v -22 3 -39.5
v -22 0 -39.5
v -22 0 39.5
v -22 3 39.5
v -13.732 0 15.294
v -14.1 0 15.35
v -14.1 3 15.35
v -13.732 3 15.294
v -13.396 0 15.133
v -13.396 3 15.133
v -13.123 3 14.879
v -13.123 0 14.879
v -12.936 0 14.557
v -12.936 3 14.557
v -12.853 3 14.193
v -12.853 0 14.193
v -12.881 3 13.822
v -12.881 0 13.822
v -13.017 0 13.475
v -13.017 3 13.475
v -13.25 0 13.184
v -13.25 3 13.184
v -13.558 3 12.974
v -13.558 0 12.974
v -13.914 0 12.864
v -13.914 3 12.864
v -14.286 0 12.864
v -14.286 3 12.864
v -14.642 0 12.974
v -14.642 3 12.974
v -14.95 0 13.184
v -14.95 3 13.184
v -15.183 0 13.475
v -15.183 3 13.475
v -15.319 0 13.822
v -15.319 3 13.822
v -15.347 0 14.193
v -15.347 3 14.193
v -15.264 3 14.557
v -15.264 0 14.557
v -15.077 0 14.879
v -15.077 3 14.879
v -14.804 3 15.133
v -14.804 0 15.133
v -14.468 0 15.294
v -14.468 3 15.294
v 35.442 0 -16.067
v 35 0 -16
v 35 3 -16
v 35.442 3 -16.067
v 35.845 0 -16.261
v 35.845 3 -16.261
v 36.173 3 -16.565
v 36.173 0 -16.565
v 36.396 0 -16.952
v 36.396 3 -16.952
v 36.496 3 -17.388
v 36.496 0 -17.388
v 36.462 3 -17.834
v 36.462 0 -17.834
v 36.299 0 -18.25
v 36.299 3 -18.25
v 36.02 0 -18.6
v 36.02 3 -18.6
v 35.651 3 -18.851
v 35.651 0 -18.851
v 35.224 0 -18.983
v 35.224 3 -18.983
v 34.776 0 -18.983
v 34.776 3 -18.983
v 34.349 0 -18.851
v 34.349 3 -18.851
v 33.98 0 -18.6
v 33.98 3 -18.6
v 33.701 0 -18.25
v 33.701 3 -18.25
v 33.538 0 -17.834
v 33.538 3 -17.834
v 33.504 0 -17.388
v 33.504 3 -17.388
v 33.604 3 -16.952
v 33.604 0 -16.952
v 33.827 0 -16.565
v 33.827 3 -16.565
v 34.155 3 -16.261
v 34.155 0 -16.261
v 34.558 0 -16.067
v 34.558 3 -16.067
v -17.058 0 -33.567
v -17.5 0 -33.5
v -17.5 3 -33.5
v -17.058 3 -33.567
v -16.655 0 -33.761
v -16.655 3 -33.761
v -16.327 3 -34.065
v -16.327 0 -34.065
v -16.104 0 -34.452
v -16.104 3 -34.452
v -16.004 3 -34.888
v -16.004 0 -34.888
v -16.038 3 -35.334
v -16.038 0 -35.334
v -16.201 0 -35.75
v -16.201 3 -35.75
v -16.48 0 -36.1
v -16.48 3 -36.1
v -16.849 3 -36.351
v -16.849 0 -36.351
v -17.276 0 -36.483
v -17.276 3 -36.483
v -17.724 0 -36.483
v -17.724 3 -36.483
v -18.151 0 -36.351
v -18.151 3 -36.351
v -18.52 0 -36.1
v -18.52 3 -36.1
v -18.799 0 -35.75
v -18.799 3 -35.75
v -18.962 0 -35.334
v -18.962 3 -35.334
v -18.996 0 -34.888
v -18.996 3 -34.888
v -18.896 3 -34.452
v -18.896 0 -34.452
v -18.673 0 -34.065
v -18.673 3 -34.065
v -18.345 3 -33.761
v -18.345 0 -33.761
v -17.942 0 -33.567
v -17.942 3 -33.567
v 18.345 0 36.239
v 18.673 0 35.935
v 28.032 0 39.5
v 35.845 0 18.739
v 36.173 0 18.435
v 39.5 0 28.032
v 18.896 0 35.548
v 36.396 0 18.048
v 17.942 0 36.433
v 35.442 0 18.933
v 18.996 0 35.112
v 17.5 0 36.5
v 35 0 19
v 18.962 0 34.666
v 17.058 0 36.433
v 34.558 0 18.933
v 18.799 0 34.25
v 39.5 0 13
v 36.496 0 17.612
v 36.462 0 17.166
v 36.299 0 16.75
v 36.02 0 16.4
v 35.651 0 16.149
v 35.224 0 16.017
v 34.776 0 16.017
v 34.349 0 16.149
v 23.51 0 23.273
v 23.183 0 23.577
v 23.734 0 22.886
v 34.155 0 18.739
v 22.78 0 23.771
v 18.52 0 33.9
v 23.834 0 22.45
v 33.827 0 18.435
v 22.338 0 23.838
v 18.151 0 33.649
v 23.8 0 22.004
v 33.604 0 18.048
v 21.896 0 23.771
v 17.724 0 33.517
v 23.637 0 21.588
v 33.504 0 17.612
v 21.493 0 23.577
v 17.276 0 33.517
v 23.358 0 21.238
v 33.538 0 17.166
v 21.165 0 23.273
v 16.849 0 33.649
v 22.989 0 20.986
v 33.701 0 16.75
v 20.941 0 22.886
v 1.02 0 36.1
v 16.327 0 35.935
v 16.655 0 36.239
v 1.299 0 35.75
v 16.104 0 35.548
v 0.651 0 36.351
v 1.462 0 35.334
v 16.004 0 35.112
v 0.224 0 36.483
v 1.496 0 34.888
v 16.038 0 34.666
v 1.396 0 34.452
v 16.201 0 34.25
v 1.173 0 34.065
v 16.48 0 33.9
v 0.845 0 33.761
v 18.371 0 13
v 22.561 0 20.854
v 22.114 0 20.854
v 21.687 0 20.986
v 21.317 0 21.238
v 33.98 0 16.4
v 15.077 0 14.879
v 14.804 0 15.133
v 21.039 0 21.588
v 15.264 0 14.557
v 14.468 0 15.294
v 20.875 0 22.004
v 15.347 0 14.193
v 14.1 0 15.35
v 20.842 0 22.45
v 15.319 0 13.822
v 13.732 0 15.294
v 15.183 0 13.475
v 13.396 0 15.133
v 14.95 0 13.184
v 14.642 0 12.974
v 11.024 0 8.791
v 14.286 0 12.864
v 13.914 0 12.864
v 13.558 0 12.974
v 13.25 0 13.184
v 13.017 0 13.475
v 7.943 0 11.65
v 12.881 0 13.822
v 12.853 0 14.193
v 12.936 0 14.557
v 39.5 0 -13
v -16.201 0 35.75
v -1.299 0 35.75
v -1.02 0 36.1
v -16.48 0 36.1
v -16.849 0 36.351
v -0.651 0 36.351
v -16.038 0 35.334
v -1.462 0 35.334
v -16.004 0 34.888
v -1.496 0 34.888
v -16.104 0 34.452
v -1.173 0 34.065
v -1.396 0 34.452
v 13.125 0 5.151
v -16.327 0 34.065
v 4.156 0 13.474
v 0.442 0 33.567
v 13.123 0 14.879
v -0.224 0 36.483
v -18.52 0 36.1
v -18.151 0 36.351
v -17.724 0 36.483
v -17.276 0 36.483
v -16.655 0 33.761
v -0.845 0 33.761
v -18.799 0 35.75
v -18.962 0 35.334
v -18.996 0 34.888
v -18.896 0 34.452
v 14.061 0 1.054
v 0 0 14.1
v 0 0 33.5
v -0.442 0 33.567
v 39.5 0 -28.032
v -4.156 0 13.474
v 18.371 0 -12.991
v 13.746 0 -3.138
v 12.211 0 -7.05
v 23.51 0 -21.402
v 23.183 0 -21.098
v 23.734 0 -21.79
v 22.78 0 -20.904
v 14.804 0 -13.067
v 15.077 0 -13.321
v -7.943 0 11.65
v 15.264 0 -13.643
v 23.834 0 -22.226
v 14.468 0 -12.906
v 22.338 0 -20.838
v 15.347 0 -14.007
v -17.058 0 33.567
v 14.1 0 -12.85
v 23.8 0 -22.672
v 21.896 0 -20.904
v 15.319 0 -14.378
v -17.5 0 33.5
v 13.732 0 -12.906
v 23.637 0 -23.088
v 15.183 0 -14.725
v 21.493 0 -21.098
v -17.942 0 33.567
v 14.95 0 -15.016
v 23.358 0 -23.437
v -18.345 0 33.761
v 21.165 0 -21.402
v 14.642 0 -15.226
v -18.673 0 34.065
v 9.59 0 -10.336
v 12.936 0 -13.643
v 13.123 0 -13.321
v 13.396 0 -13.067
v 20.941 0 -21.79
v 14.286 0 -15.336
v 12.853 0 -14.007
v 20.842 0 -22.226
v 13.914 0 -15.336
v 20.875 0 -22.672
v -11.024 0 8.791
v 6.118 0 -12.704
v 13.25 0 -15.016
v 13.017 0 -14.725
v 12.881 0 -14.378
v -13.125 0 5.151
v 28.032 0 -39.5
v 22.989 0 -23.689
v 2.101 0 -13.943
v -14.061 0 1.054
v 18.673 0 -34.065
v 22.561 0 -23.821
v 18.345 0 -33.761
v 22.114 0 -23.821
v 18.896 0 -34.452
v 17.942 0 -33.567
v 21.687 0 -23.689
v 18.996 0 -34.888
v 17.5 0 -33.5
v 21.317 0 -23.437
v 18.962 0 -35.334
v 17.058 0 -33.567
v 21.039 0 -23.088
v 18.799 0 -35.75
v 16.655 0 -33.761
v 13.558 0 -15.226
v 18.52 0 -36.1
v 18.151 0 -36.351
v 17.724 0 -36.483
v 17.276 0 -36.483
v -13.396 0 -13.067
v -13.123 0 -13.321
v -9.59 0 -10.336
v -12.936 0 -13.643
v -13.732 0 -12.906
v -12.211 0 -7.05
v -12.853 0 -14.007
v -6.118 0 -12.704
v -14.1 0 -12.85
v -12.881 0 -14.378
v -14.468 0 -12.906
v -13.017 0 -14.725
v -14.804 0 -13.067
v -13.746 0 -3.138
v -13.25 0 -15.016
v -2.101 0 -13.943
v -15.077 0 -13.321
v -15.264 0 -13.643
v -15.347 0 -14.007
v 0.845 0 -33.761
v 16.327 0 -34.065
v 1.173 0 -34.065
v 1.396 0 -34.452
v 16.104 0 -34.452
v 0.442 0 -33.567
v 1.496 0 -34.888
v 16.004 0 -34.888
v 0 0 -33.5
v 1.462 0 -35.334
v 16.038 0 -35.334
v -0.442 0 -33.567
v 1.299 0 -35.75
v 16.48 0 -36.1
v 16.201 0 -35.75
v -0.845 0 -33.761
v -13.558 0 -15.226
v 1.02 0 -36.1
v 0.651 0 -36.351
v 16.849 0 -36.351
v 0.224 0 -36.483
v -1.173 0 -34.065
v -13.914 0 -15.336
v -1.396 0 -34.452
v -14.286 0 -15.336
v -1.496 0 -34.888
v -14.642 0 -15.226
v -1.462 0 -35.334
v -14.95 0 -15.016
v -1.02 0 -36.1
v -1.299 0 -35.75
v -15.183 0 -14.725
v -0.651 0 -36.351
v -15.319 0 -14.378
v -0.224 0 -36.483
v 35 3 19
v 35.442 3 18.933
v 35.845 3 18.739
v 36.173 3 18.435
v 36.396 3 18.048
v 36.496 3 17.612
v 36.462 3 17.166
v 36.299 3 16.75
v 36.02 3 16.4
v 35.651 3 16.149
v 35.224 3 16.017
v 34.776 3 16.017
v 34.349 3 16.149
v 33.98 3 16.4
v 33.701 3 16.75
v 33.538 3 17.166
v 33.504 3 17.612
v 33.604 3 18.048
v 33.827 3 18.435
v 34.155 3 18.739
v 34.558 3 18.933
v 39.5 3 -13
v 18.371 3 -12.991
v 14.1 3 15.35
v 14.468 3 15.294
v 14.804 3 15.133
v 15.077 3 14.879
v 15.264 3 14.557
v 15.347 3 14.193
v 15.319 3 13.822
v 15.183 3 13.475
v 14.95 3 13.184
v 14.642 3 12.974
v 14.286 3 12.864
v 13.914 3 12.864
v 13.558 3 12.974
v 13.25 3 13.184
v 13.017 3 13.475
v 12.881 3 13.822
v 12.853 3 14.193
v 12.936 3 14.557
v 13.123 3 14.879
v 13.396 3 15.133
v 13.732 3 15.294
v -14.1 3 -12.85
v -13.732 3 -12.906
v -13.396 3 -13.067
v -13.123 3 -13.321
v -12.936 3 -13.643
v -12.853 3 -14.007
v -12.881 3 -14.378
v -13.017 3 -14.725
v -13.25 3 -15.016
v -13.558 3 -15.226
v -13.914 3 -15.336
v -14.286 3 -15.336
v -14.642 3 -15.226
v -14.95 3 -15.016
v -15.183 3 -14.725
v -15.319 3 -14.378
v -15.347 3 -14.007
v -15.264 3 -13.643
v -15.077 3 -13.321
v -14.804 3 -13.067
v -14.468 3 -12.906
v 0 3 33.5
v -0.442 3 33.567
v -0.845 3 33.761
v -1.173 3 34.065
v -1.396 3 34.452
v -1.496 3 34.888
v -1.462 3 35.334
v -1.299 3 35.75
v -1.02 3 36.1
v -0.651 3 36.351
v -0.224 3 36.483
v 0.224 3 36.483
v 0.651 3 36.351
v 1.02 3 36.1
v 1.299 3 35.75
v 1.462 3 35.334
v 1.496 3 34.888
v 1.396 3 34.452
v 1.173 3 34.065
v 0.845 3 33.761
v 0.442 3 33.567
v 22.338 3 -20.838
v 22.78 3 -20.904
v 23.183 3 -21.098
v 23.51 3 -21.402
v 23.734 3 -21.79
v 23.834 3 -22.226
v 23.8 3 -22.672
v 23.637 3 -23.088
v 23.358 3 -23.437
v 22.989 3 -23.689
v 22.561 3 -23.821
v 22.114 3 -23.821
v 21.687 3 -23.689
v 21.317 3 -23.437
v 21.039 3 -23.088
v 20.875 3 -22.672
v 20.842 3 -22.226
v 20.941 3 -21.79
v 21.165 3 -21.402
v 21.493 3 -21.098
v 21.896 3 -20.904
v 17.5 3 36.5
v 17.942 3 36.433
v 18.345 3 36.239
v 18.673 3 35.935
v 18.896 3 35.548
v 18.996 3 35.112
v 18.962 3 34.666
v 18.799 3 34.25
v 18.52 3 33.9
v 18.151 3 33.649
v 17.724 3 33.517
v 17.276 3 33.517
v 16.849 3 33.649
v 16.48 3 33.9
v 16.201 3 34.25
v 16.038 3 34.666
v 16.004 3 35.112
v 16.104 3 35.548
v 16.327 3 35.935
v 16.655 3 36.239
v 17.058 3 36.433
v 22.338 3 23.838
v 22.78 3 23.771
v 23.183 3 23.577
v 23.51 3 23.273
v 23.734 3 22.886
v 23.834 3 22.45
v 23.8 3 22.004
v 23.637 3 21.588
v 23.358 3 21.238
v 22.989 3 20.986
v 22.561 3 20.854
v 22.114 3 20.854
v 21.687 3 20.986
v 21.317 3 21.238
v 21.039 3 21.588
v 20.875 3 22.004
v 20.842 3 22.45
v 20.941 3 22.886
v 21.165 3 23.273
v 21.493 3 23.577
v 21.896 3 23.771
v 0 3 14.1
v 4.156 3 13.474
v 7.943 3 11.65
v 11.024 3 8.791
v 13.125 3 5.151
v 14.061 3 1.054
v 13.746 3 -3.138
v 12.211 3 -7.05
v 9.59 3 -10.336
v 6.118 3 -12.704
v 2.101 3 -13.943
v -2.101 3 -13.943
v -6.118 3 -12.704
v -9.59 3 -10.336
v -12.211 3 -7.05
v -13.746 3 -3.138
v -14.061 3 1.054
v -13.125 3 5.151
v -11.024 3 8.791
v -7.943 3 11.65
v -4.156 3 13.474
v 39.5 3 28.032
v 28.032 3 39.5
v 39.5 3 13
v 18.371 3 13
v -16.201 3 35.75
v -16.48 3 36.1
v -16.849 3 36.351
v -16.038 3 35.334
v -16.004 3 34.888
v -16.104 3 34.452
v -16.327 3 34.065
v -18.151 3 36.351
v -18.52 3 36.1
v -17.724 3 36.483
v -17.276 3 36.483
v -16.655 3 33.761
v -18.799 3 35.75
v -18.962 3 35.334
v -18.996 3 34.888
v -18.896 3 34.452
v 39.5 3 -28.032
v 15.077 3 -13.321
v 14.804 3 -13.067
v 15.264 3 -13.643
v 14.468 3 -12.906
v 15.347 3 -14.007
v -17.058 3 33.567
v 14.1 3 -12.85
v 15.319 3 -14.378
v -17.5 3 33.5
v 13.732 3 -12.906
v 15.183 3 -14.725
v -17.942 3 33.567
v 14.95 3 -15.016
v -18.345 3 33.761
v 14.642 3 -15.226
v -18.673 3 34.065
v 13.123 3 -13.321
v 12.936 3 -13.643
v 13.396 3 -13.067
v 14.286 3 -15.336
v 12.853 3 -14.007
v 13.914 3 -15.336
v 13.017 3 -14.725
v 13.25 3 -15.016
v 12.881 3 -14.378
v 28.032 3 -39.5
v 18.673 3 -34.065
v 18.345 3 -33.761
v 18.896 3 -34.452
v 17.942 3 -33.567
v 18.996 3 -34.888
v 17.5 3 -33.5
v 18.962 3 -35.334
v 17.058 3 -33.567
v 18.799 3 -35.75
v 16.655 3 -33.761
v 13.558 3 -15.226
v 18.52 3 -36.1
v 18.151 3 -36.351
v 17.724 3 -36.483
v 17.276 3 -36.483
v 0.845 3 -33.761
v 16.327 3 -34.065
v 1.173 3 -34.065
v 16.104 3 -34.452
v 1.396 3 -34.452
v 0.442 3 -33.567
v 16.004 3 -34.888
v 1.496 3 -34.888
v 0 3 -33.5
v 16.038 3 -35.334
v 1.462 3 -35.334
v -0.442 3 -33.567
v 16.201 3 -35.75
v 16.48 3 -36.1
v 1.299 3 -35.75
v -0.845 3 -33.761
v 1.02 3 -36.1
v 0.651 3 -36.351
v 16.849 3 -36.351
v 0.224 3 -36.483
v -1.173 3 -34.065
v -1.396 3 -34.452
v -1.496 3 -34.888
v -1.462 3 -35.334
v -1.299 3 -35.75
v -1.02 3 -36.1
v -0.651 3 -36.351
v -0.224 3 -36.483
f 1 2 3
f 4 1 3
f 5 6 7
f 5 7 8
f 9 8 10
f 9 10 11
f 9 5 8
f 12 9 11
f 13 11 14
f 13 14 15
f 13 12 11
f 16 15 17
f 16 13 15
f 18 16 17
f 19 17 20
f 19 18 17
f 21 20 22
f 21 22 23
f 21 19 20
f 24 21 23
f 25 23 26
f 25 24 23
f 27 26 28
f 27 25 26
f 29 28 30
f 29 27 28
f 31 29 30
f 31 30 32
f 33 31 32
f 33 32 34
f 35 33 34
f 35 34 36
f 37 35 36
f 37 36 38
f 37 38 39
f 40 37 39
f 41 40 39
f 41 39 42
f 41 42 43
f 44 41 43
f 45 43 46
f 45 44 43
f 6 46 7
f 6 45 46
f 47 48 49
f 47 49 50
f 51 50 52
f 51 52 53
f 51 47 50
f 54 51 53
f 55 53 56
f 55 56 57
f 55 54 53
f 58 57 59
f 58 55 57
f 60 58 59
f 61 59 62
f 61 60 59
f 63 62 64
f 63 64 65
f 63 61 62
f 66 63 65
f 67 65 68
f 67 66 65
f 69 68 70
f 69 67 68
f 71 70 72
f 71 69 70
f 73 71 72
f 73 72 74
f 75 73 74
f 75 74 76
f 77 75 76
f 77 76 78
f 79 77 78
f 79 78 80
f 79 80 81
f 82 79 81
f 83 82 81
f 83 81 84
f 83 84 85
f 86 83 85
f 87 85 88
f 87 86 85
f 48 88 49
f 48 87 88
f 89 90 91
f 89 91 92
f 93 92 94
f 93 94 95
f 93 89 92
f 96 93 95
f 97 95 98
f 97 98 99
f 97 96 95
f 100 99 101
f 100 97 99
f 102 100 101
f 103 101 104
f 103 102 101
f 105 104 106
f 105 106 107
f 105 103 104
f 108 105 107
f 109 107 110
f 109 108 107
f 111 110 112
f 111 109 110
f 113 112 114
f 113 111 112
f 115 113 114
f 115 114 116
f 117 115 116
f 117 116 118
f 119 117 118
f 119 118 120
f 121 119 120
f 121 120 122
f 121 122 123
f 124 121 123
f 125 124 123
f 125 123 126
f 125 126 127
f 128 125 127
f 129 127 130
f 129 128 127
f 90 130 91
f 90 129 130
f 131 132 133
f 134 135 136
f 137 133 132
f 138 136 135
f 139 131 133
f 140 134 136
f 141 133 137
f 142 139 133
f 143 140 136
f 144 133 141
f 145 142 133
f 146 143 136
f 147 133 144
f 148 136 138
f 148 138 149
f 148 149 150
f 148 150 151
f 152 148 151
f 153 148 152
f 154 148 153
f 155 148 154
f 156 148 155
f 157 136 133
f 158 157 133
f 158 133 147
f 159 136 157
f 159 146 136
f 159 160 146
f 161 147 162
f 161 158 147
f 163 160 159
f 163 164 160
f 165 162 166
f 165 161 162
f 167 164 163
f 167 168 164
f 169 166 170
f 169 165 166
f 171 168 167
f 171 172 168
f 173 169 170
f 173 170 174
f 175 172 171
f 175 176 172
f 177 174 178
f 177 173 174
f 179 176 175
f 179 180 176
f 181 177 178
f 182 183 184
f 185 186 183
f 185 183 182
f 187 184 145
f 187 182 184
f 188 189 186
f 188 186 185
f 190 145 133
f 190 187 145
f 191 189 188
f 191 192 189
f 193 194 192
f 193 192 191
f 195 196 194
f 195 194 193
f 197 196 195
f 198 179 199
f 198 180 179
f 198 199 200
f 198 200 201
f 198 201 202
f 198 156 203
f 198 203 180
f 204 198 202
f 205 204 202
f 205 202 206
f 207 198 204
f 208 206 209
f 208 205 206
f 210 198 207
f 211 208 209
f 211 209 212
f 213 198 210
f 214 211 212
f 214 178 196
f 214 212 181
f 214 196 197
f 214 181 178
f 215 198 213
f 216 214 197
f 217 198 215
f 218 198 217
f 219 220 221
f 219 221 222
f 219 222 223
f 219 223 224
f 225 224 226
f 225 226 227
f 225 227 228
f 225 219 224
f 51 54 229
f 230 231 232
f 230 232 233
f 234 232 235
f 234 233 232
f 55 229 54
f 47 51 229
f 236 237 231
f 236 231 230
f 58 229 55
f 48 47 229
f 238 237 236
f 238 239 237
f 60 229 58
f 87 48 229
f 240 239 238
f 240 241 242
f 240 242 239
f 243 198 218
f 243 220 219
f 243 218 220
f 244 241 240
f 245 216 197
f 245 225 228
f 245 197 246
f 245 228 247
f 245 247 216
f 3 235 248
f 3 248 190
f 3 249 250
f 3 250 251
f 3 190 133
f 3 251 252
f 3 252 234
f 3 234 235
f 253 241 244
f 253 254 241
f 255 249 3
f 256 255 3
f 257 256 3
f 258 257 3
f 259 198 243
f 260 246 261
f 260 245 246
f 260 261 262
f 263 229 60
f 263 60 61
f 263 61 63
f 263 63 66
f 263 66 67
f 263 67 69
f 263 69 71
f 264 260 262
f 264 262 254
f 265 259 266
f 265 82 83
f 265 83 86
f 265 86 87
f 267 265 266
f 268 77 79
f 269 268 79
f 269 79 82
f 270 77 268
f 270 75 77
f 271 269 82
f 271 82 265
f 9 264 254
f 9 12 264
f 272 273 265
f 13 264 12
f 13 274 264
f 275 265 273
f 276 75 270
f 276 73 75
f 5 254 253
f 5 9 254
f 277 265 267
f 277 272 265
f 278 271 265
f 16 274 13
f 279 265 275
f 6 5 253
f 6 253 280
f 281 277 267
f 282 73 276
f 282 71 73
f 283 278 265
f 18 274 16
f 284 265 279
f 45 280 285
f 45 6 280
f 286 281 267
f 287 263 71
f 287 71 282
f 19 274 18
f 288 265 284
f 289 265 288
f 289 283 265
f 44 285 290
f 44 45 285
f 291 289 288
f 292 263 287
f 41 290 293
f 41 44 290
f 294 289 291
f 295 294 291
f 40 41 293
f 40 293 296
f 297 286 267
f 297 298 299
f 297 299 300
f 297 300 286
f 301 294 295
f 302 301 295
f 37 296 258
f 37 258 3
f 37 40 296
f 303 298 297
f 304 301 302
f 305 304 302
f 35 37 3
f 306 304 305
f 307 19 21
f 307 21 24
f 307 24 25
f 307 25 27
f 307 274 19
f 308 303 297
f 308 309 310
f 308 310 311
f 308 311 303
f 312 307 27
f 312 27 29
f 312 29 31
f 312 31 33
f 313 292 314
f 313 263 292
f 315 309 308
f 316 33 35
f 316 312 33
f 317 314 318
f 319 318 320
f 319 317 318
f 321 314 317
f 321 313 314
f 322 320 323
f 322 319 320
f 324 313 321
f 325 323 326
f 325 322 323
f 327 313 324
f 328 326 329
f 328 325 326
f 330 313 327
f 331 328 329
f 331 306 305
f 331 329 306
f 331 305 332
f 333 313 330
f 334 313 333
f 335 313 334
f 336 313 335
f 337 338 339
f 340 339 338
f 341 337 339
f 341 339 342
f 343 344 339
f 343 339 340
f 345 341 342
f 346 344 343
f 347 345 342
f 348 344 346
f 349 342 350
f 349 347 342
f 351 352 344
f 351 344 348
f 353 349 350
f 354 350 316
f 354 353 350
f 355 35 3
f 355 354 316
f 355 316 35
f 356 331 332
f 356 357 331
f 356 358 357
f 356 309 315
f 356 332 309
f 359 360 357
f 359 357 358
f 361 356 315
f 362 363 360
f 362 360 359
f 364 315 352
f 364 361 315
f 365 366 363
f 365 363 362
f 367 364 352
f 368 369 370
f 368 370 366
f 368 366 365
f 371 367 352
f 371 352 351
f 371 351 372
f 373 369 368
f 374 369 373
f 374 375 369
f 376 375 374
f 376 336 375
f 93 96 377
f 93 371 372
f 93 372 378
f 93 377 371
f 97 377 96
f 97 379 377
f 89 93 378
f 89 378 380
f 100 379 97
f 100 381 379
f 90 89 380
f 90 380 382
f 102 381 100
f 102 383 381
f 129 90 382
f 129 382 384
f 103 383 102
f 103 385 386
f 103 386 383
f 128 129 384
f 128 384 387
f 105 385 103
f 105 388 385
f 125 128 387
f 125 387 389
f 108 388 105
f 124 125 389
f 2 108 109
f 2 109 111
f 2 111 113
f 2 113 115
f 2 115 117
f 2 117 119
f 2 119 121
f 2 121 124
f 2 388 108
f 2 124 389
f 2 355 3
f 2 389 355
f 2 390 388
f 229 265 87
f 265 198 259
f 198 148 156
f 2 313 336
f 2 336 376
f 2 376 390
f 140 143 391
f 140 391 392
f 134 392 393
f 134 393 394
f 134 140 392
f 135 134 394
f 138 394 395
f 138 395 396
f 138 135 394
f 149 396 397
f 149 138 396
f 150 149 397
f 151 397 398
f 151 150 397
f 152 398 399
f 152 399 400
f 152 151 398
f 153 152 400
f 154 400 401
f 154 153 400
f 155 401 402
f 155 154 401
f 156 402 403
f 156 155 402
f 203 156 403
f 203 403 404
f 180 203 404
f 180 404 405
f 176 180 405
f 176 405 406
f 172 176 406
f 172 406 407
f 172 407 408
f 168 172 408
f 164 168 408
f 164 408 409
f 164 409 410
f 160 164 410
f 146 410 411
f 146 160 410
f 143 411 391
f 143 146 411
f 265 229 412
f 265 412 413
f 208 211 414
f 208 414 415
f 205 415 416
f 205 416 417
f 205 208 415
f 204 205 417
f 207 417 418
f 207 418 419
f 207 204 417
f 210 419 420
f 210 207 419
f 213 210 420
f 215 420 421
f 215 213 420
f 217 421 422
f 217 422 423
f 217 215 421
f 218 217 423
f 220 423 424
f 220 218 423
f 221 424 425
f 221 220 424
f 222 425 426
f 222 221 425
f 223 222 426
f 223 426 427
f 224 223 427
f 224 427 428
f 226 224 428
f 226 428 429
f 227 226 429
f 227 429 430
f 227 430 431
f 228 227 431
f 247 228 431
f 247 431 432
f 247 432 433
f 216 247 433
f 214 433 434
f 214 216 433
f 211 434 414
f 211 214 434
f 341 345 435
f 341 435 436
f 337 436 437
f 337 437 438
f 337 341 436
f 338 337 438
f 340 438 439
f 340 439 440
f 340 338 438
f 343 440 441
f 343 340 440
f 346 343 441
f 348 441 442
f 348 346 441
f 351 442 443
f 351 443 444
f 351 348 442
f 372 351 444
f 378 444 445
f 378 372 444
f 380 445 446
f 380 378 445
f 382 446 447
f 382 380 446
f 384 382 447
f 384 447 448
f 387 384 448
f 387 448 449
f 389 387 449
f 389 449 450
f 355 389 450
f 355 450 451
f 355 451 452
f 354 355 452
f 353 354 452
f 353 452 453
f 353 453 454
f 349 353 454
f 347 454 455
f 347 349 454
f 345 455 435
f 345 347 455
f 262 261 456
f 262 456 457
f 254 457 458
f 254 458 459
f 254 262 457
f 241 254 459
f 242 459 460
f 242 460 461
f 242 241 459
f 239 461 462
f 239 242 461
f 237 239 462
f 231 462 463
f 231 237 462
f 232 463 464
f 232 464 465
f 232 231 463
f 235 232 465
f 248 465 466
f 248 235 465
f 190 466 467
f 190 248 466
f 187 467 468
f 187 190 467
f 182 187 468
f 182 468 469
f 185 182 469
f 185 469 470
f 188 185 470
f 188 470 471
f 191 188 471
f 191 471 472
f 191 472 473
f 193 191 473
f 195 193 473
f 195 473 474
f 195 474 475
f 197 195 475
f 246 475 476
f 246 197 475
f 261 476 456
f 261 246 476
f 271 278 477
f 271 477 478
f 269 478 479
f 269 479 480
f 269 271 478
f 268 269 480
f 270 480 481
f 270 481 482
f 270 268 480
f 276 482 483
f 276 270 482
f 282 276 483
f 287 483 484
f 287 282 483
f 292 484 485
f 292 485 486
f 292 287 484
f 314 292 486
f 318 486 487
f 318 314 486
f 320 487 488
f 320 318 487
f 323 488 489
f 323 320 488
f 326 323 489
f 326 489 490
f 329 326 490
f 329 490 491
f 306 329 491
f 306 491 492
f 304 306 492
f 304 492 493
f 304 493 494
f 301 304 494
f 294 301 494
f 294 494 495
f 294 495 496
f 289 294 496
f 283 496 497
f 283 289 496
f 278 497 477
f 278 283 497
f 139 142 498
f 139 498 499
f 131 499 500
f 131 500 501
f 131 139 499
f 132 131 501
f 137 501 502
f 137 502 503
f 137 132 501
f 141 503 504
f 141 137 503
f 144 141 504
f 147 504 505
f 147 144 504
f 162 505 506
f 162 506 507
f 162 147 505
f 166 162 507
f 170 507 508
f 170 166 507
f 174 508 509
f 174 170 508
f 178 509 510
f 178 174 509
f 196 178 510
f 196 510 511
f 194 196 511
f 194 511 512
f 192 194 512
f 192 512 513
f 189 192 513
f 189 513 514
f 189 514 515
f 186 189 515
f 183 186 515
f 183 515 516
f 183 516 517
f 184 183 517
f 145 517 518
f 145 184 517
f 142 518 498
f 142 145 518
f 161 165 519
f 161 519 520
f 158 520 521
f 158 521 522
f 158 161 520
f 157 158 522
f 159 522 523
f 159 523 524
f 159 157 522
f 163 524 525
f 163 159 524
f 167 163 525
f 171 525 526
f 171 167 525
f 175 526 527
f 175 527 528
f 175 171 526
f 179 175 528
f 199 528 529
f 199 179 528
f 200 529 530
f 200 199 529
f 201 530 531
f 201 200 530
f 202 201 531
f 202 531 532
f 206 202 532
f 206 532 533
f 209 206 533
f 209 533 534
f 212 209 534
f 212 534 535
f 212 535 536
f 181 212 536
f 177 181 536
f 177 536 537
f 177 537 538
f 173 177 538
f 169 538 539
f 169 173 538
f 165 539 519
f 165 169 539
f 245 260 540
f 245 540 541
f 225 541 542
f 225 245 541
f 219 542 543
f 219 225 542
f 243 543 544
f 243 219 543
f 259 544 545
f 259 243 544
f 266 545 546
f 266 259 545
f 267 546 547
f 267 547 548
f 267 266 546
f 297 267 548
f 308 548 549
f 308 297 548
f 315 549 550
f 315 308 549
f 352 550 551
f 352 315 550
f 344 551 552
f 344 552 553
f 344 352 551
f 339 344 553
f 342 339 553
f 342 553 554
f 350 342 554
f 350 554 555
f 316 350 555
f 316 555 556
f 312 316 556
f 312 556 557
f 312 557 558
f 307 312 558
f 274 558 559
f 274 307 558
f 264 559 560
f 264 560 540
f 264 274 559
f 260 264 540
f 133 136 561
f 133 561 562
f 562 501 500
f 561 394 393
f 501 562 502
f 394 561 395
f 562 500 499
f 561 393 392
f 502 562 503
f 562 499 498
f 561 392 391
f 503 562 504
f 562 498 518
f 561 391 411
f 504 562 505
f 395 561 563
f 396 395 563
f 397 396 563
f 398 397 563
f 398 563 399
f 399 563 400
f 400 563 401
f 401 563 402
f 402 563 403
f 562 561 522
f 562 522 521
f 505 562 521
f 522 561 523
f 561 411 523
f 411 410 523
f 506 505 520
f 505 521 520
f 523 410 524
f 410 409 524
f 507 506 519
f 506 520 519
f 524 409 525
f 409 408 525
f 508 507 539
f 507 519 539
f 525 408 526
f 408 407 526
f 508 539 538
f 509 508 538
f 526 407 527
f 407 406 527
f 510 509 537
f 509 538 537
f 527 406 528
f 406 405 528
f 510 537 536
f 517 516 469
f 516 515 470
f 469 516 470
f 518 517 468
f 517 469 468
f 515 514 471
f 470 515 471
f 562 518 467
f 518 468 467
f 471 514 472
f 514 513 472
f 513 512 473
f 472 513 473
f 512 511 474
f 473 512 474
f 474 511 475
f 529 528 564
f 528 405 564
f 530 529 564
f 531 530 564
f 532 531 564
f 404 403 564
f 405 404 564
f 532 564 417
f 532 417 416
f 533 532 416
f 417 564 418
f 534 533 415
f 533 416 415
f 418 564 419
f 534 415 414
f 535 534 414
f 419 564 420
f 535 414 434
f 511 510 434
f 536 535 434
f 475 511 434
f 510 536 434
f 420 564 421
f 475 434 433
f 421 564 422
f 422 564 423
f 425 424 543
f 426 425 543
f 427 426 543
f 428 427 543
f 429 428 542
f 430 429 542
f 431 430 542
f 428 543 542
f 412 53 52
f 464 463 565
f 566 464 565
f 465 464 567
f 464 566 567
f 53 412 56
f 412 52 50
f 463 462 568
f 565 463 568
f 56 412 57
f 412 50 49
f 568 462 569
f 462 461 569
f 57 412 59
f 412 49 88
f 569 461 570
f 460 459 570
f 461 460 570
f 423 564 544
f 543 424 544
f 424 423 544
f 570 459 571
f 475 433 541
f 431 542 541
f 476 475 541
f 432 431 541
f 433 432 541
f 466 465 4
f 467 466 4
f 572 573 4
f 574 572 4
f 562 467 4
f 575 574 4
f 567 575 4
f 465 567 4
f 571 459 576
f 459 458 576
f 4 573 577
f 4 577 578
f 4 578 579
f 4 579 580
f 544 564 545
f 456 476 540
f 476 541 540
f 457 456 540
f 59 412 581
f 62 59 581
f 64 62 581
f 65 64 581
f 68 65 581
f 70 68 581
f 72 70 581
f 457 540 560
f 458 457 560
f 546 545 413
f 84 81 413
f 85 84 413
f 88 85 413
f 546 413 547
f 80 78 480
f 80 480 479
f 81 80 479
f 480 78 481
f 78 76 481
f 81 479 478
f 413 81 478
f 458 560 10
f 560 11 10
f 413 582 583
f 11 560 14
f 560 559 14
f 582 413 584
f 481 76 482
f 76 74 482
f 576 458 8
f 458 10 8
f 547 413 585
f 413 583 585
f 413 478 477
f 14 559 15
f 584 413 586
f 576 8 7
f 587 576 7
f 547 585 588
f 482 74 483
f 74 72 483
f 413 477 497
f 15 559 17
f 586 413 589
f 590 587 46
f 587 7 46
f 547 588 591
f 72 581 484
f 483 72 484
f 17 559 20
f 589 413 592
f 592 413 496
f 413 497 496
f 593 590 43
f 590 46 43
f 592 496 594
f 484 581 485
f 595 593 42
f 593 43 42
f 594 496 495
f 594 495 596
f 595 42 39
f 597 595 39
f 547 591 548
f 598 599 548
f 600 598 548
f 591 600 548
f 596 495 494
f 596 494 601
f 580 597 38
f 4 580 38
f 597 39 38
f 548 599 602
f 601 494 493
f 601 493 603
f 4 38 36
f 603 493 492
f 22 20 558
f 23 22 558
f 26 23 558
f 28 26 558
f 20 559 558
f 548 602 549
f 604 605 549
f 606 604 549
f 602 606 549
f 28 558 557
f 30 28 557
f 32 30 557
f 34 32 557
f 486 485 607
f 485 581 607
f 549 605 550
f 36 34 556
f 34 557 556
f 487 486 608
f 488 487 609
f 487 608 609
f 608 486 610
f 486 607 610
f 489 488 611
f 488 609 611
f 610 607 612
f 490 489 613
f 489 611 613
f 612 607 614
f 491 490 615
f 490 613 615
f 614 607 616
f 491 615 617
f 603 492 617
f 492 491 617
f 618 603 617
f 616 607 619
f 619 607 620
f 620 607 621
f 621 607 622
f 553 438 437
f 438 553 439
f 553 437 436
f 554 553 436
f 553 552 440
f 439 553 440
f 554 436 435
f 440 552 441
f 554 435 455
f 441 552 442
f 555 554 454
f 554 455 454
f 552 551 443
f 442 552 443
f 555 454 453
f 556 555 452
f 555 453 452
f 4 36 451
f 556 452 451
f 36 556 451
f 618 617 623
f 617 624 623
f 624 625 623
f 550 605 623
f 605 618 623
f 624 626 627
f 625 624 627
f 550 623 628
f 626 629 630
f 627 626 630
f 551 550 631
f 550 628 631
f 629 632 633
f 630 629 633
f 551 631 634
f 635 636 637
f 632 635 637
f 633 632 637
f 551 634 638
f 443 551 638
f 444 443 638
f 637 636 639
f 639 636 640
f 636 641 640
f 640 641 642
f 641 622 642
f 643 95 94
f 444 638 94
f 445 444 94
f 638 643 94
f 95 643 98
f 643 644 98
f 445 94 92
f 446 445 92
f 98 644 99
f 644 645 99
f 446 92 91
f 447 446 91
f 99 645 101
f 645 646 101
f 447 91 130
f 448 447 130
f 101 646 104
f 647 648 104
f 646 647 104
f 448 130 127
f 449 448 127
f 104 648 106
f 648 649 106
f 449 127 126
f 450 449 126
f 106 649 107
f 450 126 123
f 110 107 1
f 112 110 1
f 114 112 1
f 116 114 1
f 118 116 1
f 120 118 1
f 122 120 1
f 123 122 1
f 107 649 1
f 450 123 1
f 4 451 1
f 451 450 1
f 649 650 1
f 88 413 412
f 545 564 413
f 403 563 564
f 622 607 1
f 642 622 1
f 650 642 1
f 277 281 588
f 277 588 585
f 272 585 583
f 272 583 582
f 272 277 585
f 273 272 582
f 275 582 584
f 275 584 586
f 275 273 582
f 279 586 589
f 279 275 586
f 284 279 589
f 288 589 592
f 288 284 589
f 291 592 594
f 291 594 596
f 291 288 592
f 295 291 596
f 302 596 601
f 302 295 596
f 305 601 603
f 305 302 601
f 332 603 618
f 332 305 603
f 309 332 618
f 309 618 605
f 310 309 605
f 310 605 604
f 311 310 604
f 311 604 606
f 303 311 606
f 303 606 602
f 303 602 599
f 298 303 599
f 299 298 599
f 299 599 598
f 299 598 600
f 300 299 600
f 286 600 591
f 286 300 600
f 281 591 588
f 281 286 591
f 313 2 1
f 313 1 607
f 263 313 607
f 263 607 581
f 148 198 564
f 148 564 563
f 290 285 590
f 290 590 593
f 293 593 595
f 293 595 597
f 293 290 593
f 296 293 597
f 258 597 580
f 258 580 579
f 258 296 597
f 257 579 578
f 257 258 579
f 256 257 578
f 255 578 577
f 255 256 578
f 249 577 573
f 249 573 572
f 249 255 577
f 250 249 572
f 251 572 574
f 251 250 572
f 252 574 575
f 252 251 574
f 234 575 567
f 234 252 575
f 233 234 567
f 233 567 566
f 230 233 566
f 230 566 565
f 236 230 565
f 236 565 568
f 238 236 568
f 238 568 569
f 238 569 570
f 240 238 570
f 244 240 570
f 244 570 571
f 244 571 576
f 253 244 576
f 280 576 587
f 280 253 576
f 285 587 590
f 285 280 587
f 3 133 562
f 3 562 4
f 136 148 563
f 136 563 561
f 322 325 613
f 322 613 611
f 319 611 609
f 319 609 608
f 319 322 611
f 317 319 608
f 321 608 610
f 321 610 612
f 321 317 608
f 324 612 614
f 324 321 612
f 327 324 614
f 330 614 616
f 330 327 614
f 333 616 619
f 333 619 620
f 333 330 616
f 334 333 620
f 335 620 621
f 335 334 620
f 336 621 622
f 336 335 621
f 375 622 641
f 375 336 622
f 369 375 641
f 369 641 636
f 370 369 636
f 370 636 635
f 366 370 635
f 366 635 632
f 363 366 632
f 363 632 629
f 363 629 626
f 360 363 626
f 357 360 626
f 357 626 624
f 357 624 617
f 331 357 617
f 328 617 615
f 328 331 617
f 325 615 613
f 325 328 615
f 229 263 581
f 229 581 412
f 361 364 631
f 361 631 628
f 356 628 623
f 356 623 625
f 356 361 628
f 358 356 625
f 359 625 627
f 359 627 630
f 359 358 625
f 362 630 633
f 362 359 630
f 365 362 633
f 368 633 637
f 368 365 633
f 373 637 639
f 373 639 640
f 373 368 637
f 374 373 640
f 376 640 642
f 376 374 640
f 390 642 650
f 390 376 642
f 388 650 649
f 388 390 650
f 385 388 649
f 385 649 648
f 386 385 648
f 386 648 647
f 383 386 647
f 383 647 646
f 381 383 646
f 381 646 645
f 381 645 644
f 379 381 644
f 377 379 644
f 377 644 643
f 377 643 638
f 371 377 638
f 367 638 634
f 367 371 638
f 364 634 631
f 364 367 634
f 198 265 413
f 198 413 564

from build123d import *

# Parameters (mm, degrees)
SKETCH_1_R      = 1.5
SKETCH_1_R_2    = 1.25
SKETCH_1_R_3    = 14.1
EXTRUDE_1_DEPTH = 3


with BuildPart() as part:
    # 草图1 → 凸台-拉伸1 (new body)
    with BuildSketch(Plane(origin=(0, 0, 0), x_dir=(1, 0, 0), z_dir=(0, 1, 0))):
        Polygon((39.5, 13), (18.370549784, 12.991262473), (18.370549784, -13), (39.5, -13), (39.5, -28.031524747), (28.031524747, -39.5), (-22, -39.5), (-22, 30.5), (-22, 39.5), (28.031524747, 39.5), (39.5, 28.031524747), align=None)
        with Locations(Location((17.5, 35, 0), (0, 0, 270))):
            Circle(SKETCH_1_R, mode=Mode.SUBTRACT)
        with Locations(Location((22.337720199, 22.337720199, 0), (0, 0, 270))):
            Circle(SKETCH_1_R, mode=Mode.SUBTRACT)
        with Locations(Location((35, 17.5, 0), (0, 0, 270))):
            Circle(SKETCH_1_R, mode=Mode.SUBTRACT)
        with Locations(Location((17.5, -35, 0), (0, 0, 270))):
            Circle(SKETCH_1_R, mode=Mode.SUBTRACT)
        with Locations(Location((22.337720199, -22.337720199, 0), (0, 0, 270))):
            Circle(SKETCH_1_R, mode=Mode.SUBTRACT)
        with Locations(Location((35, -17.5, 0), (0, 0, 270))):
            Circle(SKETCH_1_R, mode=Mode.SUBTRACT)
        with Locations(Location((-14.1, 14.1, 0), (0, 0, 270))):
            Circle(SKETCH_1_R_2, mode=Mode.SUBTRACT)
        with Locations(Location((14.1, -14.1, 0), (0, 0, 270))):
            Circle(SKETCH_1_R_2, mode=Mode.SUBTRACT)
        with Locations(Location((0, 35, 0), (0, 0, 270))):
            Circle(SKETCH_1_R, mode=Mode.SUBTRACT)
        with Locations(Location((-17.5, 35, 0), (0, 0, 270))):
            Circle(SKETCH_1_R, mode=Mode.SUBTRACT)
        with Locations(Location((0, -35, 0), (0, 0, 90))):
            Circle(SKETCH_1_R, mode=Mode.SUBTRACT)
        with Locations(Location((-17.5, -35, 0), (0, 0, 90))):
            Circle(SKETCH_1_R, mode=Mode.SUBTRACT)
        with Locations(Location((14.1, 14.1, 0), (0, 0, 270))):
            Circle(SKETCH_1_R_2, mode=Mode.SUBTRACT)
        with Locations(Location((-14.1, -14.1, 0), (0, 0, 270))):
            Circle(SKETCH_1_R_2, mode=Mode.SUBTRACT)
        with Locations(Location((0, 0, 0), (0, 0, 270))):
            Circle(SKETCH_1_R_3, mode=Mode.SUBTRACT)
    extrude(amount=EXTRUDE_1_DEPTH)


solid = part.part
